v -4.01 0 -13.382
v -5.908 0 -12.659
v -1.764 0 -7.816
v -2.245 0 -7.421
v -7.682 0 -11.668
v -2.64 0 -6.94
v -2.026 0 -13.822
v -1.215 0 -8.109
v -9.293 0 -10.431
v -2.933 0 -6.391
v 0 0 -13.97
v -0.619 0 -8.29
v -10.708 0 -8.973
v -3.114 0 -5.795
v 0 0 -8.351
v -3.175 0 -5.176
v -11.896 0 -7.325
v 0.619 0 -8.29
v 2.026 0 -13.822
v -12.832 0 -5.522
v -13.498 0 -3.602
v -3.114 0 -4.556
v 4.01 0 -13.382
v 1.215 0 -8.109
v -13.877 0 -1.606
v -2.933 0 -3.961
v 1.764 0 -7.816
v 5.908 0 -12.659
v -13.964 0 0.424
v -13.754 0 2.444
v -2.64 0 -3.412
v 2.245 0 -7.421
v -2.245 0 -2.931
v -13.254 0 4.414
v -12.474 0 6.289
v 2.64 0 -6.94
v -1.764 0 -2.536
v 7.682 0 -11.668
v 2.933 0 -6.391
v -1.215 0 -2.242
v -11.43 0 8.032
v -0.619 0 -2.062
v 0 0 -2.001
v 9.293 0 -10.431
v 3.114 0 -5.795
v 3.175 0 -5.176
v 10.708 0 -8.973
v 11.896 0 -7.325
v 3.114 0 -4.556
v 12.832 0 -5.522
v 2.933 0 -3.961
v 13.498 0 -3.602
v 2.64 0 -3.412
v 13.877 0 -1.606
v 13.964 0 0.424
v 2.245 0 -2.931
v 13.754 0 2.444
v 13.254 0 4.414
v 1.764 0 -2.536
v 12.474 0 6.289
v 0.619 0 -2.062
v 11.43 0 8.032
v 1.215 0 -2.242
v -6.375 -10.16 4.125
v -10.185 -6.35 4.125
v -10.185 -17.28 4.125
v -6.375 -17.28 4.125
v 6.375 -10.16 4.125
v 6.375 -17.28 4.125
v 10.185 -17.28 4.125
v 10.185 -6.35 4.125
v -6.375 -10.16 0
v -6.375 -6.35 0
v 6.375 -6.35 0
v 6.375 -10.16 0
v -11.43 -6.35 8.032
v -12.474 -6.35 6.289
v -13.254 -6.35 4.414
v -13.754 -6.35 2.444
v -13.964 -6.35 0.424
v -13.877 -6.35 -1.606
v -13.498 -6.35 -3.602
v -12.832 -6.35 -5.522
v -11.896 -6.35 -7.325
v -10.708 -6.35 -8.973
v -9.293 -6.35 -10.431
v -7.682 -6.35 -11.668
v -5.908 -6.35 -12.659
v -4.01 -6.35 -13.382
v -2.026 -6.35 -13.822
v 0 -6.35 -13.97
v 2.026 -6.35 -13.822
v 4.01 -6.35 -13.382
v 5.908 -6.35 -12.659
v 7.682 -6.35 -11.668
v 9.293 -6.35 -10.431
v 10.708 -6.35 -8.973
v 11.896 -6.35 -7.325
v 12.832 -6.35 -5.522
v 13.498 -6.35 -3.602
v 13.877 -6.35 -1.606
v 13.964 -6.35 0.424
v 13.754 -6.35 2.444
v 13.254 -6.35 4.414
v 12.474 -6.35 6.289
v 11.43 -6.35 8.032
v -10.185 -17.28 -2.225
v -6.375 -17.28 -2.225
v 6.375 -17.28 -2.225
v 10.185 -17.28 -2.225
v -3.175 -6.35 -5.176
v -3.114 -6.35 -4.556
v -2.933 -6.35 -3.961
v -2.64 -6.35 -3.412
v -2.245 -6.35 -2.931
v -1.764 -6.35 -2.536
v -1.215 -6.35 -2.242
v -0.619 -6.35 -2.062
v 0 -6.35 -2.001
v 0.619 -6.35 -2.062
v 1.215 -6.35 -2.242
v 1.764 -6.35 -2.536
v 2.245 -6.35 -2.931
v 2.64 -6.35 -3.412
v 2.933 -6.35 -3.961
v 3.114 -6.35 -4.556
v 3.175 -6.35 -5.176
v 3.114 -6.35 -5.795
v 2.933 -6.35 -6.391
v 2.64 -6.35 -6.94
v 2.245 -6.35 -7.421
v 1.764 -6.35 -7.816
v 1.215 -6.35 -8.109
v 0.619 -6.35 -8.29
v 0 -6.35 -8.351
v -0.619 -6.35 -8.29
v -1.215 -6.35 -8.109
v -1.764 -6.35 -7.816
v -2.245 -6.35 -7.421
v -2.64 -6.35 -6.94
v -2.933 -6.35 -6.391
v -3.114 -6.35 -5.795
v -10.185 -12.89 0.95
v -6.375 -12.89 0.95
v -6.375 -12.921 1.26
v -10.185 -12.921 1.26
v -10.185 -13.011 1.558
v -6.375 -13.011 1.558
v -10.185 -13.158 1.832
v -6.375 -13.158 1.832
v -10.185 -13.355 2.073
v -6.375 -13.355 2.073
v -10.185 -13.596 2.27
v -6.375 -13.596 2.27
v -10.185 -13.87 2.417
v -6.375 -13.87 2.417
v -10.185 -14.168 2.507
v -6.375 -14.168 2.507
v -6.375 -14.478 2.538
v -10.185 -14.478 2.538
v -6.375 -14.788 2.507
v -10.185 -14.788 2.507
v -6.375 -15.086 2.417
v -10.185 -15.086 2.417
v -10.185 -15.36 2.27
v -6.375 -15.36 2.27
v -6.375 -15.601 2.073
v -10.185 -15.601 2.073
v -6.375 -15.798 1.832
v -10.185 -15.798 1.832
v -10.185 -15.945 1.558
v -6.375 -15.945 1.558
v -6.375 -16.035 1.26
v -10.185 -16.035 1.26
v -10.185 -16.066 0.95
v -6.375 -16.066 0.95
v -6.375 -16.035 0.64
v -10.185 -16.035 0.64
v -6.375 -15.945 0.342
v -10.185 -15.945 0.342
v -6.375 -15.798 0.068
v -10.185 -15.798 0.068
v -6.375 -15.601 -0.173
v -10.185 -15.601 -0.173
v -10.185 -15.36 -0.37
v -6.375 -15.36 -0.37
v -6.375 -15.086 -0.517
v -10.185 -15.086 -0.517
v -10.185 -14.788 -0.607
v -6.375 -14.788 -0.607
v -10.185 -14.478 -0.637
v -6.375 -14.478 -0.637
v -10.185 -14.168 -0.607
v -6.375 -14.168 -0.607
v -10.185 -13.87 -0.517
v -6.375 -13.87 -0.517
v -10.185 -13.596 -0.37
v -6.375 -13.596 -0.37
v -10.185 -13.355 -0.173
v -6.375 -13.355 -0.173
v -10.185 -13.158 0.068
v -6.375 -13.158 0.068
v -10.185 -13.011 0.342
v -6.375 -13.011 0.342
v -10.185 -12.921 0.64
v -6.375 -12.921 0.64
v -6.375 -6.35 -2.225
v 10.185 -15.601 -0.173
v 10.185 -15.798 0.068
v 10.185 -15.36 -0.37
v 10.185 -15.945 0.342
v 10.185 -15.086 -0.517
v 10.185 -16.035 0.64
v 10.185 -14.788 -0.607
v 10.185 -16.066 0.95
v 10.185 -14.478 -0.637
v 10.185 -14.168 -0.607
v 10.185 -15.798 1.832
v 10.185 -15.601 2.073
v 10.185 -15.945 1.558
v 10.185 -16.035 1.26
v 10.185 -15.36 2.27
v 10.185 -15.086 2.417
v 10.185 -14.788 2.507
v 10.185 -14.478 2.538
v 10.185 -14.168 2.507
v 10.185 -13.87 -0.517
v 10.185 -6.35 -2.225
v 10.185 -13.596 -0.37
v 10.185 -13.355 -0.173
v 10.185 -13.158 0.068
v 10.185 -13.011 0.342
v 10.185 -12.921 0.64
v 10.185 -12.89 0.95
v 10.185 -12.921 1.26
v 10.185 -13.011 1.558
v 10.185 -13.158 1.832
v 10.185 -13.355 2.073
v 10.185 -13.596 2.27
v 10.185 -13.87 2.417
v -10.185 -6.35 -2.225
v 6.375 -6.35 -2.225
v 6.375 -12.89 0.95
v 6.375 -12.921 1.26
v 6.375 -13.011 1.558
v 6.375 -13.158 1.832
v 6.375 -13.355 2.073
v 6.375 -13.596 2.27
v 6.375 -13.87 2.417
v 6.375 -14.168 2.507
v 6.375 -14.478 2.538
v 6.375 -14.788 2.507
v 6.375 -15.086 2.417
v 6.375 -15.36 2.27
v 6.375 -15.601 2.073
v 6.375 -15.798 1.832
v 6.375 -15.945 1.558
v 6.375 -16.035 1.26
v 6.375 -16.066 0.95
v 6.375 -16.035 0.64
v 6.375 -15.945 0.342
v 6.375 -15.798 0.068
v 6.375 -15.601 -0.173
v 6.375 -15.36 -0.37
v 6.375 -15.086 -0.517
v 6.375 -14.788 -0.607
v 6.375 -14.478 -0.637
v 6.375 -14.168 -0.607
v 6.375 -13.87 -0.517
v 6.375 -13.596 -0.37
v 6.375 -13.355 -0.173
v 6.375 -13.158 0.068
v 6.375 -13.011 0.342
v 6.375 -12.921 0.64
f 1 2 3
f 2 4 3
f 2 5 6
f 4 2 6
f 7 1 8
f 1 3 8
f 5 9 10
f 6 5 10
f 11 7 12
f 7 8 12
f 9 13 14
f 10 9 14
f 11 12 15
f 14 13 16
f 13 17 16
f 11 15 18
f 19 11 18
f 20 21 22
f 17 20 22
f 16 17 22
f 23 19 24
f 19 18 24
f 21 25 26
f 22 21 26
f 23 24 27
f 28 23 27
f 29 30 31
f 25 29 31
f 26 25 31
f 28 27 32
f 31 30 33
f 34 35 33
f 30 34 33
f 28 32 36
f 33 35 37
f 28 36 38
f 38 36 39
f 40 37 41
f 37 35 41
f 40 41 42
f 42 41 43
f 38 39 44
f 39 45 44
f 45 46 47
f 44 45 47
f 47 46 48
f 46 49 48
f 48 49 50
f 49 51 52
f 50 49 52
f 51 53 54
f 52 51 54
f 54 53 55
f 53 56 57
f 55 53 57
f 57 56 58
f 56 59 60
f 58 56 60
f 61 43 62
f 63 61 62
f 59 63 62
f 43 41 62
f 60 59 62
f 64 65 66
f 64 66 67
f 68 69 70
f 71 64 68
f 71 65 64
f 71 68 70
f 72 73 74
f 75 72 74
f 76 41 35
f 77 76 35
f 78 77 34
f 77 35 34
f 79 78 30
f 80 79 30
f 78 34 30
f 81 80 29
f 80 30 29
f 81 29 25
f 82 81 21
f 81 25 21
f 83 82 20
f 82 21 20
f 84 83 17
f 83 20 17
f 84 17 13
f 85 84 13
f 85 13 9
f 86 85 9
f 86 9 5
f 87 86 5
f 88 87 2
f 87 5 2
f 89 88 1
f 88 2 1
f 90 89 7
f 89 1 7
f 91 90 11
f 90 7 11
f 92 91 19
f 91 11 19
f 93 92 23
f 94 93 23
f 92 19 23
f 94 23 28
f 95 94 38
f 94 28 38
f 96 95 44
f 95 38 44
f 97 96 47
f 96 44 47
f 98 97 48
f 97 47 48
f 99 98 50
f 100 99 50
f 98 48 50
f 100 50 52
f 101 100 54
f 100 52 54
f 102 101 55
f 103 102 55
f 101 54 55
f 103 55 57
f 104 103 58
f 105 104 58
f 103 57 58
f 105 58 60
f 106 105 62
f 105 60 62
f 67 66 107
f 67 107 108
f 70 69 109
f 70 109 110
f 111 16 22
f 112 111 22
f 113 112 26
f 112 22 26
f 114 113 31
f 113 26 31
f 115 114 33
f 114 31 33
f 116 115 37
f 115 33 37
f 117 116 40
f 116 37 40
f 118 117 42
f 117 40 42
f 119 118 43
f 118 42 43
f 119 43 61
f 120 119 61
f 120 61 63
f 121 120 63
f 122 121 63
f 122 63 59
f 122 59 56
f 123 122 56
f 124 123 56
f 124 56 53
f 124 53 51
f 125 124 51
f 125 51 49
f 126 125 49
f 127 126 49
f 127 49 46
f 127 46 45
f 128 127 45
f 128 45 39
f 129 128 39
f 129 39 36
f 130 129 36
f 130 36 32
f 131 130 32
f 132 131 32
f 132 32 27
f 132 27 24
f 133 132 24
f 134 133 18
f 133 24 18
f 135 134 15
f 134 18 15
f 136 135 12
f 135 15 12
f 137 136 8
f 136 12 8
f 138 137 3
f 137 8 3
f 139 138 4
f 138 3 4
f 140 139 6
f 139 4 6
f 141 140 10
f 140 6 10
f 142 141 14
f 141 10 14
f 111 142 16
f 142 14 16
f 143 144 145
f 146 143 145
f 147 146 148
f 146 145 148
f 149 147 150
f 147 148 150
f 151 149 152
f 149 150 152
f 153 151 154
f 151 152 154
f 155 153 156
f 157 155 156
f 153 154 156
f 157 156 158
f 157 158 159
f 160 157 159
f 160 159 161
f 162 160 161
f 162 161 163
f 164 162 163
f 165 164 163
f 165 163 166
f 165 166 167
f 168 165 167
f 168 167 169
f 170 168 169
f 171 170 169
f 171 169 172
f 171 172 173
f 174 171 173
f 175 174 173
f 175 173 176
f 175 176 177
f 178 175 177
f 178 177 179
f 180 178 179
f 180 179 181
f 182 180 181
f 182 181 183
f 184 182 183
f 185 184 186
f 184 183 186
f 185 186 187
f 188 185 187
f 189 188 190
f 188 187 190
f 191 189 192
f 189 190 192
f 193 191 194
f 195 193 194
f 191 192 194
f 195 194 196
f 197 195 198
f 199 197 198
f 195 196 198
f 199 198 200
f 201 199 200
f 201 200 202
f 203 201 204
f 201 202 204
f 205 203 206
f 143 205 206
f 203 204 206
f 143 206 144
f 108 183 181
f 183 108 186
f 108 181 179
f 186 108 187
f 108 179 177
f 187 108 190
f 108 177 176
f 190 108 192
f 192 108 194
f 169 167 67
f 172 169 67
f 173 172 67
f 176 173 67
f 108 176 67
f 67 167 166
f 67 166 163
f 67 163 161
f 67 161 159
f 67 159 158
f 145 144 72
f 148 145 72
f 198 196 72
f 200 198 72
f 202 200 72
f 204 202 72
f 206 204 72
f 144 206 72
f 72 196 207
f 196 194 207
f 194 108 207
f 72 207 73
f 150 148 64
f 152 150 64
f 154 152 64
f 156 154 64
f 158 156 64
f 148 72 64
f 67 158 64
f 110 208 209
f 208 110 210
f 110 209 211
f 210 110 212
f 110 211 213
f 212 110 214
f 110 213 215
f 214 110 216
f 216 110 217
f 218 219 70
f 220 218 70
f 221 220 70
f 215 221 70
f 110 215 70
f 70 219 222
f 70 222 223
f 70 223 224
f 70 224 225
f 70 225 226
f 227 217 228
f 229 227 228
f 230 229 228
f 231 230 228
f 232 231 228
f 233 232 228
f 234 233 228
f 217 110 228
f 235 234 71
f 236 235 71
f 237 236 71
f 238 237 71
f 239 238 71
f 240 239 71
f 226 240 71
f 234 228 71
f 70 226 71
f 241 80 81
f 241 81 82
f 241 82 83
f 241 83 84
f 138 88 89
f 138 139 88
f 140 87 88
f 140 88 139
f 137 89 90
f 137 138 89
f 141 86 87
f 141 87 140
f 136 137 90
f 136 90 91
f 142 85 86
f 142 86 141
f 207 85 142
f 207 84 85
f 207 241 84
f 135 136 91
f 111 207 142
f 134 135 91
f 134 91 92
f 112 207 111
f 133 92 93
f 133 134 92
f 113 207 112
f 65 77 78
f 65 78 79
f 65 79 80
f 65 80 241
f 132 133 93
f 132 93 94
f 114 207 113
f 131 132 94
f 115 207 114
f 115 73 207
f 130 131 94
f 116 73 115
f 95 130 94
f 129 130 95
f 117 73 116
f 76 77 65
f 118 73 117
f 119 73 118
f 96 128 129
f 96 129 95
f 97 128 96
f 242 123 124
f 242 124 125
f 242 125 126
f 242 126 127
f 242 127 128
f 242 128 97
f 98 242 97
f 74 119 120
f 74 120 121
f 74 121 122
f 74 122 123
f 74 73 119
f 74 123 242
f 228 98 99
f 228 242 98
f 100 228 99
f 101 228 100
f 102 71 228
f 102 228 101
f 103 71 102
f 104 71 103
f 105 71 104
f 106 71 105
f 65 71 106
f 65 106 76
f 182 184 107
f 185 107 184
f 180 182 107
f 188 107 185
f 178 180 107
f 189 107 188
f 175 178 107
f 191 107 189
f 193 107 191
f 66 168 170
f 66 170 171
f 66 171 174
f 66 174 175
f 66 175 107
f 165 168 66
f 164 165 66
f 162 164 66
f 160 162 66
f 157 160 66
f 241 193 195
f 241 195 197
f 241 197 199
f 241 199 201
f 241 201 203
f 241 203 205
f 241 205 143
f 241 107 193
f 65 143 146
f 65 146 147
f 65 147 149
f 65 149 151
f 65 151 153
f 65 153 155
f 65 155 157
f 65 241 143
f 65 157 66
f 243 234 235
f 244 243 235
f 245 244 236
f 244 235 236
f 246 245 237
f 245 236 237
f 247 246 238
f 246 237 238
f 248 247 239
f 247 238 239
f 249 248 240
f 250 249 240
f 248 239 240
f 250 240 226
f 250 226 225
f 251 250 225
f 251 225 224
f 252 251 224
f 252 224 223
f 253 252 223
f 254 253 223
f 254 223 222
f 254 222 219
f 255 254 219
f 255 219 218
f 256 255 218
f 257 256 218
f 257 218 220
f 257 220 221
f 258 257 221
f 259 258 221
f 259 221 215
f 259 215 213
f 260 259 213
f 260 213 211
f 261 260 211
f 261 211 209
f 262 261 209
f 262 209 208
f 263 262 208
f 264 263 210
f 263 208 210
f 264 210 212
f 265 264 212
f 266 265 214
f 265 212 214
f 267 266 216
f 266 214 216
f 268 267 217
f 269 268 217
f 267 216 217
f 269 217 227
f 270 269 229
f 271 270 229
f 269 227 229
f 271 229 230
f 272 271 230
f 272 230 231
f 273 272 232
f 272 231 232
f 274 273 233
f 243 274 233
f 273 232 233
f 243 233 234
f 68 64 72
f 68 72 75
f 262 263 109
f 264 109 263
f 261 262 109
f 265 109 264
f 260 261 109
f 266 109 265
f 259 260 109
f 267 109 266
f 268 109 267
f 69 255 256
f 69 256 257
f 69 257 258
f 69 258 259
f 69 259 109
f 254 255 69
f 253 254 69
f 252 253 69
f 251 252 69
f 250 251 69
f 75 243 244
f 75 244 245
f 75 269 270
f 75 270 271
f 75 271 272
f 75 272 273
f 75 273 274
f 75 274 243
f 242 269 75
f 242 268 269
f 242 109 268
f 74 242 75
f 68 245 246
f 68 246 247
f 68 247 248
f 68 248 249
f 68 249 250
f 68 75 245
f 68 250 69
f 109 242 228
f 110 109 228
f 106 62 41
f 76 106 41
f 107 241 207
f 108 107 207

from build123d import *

# Parameters (mm, degrees)
F1_DEPTH = 6.35
F3_D     = 6.35
F2_W     = 3.81
F2_H     = 6.35
F4_DEPTH = 10.9299502
F6_D     = 3.175
F7_W     = 12.7500126
F7_H     = 4.1250048568
F8_DEPTH = 3.81


# Not quite as in the source:
# - a feature names something its author has since deleted; it is built from what else it names


with BuildPart() as f1:
    # F0 (on Front) → F1 (new body)
    with BuildSketch(Plane.XZ):
        with BuildLine():
            Line((11.43, 8.0321852568), (-11.43, 8.0321852568))
            ThreePointArc((-11.43, 8.0321852568), (0, -13.97), (11.43, 8.0321852568))
        make_face()
    extrude(amount=F1_DEPTH)

    # F3 (through all)
    with Locations(Plane.XZ.offset(6.35)):
        with Locations((0, -5.1758147432)):
            Hole(F3_D / 2)

    # F2 (on face) → F4 (join)
    with BuildSketch(Plane.XZ.offset(6.35)):
        with Locations((-8.2800063, 0.9500048568)):
            Rectangle(F2_W, F2_H)
        with Locations((8.2800063, 0.9500048568)):
            Rectangle(F2_W, F2_H)
    extrude(amount=F4_DEPTH)

    # F6 (through all)
    with Locations(Plane(origin=(-10.1850063, 0, 0), x_dir=(0, -1, 0), z_dir=(-1, 0, 0))):
        with Locations((14.478, 0.9500048568)):
            Hole(F6_D / 2)

    # F7 (on face) → F8 (join)
    with BuildSketch(Plane.XZ.offset(6.35)):
        with Locations((0, 2.0625024284)):
            Rectangle(F7_W, F7_H)
    extrude(amount=F8_DEPTH)


solid = f1.part
